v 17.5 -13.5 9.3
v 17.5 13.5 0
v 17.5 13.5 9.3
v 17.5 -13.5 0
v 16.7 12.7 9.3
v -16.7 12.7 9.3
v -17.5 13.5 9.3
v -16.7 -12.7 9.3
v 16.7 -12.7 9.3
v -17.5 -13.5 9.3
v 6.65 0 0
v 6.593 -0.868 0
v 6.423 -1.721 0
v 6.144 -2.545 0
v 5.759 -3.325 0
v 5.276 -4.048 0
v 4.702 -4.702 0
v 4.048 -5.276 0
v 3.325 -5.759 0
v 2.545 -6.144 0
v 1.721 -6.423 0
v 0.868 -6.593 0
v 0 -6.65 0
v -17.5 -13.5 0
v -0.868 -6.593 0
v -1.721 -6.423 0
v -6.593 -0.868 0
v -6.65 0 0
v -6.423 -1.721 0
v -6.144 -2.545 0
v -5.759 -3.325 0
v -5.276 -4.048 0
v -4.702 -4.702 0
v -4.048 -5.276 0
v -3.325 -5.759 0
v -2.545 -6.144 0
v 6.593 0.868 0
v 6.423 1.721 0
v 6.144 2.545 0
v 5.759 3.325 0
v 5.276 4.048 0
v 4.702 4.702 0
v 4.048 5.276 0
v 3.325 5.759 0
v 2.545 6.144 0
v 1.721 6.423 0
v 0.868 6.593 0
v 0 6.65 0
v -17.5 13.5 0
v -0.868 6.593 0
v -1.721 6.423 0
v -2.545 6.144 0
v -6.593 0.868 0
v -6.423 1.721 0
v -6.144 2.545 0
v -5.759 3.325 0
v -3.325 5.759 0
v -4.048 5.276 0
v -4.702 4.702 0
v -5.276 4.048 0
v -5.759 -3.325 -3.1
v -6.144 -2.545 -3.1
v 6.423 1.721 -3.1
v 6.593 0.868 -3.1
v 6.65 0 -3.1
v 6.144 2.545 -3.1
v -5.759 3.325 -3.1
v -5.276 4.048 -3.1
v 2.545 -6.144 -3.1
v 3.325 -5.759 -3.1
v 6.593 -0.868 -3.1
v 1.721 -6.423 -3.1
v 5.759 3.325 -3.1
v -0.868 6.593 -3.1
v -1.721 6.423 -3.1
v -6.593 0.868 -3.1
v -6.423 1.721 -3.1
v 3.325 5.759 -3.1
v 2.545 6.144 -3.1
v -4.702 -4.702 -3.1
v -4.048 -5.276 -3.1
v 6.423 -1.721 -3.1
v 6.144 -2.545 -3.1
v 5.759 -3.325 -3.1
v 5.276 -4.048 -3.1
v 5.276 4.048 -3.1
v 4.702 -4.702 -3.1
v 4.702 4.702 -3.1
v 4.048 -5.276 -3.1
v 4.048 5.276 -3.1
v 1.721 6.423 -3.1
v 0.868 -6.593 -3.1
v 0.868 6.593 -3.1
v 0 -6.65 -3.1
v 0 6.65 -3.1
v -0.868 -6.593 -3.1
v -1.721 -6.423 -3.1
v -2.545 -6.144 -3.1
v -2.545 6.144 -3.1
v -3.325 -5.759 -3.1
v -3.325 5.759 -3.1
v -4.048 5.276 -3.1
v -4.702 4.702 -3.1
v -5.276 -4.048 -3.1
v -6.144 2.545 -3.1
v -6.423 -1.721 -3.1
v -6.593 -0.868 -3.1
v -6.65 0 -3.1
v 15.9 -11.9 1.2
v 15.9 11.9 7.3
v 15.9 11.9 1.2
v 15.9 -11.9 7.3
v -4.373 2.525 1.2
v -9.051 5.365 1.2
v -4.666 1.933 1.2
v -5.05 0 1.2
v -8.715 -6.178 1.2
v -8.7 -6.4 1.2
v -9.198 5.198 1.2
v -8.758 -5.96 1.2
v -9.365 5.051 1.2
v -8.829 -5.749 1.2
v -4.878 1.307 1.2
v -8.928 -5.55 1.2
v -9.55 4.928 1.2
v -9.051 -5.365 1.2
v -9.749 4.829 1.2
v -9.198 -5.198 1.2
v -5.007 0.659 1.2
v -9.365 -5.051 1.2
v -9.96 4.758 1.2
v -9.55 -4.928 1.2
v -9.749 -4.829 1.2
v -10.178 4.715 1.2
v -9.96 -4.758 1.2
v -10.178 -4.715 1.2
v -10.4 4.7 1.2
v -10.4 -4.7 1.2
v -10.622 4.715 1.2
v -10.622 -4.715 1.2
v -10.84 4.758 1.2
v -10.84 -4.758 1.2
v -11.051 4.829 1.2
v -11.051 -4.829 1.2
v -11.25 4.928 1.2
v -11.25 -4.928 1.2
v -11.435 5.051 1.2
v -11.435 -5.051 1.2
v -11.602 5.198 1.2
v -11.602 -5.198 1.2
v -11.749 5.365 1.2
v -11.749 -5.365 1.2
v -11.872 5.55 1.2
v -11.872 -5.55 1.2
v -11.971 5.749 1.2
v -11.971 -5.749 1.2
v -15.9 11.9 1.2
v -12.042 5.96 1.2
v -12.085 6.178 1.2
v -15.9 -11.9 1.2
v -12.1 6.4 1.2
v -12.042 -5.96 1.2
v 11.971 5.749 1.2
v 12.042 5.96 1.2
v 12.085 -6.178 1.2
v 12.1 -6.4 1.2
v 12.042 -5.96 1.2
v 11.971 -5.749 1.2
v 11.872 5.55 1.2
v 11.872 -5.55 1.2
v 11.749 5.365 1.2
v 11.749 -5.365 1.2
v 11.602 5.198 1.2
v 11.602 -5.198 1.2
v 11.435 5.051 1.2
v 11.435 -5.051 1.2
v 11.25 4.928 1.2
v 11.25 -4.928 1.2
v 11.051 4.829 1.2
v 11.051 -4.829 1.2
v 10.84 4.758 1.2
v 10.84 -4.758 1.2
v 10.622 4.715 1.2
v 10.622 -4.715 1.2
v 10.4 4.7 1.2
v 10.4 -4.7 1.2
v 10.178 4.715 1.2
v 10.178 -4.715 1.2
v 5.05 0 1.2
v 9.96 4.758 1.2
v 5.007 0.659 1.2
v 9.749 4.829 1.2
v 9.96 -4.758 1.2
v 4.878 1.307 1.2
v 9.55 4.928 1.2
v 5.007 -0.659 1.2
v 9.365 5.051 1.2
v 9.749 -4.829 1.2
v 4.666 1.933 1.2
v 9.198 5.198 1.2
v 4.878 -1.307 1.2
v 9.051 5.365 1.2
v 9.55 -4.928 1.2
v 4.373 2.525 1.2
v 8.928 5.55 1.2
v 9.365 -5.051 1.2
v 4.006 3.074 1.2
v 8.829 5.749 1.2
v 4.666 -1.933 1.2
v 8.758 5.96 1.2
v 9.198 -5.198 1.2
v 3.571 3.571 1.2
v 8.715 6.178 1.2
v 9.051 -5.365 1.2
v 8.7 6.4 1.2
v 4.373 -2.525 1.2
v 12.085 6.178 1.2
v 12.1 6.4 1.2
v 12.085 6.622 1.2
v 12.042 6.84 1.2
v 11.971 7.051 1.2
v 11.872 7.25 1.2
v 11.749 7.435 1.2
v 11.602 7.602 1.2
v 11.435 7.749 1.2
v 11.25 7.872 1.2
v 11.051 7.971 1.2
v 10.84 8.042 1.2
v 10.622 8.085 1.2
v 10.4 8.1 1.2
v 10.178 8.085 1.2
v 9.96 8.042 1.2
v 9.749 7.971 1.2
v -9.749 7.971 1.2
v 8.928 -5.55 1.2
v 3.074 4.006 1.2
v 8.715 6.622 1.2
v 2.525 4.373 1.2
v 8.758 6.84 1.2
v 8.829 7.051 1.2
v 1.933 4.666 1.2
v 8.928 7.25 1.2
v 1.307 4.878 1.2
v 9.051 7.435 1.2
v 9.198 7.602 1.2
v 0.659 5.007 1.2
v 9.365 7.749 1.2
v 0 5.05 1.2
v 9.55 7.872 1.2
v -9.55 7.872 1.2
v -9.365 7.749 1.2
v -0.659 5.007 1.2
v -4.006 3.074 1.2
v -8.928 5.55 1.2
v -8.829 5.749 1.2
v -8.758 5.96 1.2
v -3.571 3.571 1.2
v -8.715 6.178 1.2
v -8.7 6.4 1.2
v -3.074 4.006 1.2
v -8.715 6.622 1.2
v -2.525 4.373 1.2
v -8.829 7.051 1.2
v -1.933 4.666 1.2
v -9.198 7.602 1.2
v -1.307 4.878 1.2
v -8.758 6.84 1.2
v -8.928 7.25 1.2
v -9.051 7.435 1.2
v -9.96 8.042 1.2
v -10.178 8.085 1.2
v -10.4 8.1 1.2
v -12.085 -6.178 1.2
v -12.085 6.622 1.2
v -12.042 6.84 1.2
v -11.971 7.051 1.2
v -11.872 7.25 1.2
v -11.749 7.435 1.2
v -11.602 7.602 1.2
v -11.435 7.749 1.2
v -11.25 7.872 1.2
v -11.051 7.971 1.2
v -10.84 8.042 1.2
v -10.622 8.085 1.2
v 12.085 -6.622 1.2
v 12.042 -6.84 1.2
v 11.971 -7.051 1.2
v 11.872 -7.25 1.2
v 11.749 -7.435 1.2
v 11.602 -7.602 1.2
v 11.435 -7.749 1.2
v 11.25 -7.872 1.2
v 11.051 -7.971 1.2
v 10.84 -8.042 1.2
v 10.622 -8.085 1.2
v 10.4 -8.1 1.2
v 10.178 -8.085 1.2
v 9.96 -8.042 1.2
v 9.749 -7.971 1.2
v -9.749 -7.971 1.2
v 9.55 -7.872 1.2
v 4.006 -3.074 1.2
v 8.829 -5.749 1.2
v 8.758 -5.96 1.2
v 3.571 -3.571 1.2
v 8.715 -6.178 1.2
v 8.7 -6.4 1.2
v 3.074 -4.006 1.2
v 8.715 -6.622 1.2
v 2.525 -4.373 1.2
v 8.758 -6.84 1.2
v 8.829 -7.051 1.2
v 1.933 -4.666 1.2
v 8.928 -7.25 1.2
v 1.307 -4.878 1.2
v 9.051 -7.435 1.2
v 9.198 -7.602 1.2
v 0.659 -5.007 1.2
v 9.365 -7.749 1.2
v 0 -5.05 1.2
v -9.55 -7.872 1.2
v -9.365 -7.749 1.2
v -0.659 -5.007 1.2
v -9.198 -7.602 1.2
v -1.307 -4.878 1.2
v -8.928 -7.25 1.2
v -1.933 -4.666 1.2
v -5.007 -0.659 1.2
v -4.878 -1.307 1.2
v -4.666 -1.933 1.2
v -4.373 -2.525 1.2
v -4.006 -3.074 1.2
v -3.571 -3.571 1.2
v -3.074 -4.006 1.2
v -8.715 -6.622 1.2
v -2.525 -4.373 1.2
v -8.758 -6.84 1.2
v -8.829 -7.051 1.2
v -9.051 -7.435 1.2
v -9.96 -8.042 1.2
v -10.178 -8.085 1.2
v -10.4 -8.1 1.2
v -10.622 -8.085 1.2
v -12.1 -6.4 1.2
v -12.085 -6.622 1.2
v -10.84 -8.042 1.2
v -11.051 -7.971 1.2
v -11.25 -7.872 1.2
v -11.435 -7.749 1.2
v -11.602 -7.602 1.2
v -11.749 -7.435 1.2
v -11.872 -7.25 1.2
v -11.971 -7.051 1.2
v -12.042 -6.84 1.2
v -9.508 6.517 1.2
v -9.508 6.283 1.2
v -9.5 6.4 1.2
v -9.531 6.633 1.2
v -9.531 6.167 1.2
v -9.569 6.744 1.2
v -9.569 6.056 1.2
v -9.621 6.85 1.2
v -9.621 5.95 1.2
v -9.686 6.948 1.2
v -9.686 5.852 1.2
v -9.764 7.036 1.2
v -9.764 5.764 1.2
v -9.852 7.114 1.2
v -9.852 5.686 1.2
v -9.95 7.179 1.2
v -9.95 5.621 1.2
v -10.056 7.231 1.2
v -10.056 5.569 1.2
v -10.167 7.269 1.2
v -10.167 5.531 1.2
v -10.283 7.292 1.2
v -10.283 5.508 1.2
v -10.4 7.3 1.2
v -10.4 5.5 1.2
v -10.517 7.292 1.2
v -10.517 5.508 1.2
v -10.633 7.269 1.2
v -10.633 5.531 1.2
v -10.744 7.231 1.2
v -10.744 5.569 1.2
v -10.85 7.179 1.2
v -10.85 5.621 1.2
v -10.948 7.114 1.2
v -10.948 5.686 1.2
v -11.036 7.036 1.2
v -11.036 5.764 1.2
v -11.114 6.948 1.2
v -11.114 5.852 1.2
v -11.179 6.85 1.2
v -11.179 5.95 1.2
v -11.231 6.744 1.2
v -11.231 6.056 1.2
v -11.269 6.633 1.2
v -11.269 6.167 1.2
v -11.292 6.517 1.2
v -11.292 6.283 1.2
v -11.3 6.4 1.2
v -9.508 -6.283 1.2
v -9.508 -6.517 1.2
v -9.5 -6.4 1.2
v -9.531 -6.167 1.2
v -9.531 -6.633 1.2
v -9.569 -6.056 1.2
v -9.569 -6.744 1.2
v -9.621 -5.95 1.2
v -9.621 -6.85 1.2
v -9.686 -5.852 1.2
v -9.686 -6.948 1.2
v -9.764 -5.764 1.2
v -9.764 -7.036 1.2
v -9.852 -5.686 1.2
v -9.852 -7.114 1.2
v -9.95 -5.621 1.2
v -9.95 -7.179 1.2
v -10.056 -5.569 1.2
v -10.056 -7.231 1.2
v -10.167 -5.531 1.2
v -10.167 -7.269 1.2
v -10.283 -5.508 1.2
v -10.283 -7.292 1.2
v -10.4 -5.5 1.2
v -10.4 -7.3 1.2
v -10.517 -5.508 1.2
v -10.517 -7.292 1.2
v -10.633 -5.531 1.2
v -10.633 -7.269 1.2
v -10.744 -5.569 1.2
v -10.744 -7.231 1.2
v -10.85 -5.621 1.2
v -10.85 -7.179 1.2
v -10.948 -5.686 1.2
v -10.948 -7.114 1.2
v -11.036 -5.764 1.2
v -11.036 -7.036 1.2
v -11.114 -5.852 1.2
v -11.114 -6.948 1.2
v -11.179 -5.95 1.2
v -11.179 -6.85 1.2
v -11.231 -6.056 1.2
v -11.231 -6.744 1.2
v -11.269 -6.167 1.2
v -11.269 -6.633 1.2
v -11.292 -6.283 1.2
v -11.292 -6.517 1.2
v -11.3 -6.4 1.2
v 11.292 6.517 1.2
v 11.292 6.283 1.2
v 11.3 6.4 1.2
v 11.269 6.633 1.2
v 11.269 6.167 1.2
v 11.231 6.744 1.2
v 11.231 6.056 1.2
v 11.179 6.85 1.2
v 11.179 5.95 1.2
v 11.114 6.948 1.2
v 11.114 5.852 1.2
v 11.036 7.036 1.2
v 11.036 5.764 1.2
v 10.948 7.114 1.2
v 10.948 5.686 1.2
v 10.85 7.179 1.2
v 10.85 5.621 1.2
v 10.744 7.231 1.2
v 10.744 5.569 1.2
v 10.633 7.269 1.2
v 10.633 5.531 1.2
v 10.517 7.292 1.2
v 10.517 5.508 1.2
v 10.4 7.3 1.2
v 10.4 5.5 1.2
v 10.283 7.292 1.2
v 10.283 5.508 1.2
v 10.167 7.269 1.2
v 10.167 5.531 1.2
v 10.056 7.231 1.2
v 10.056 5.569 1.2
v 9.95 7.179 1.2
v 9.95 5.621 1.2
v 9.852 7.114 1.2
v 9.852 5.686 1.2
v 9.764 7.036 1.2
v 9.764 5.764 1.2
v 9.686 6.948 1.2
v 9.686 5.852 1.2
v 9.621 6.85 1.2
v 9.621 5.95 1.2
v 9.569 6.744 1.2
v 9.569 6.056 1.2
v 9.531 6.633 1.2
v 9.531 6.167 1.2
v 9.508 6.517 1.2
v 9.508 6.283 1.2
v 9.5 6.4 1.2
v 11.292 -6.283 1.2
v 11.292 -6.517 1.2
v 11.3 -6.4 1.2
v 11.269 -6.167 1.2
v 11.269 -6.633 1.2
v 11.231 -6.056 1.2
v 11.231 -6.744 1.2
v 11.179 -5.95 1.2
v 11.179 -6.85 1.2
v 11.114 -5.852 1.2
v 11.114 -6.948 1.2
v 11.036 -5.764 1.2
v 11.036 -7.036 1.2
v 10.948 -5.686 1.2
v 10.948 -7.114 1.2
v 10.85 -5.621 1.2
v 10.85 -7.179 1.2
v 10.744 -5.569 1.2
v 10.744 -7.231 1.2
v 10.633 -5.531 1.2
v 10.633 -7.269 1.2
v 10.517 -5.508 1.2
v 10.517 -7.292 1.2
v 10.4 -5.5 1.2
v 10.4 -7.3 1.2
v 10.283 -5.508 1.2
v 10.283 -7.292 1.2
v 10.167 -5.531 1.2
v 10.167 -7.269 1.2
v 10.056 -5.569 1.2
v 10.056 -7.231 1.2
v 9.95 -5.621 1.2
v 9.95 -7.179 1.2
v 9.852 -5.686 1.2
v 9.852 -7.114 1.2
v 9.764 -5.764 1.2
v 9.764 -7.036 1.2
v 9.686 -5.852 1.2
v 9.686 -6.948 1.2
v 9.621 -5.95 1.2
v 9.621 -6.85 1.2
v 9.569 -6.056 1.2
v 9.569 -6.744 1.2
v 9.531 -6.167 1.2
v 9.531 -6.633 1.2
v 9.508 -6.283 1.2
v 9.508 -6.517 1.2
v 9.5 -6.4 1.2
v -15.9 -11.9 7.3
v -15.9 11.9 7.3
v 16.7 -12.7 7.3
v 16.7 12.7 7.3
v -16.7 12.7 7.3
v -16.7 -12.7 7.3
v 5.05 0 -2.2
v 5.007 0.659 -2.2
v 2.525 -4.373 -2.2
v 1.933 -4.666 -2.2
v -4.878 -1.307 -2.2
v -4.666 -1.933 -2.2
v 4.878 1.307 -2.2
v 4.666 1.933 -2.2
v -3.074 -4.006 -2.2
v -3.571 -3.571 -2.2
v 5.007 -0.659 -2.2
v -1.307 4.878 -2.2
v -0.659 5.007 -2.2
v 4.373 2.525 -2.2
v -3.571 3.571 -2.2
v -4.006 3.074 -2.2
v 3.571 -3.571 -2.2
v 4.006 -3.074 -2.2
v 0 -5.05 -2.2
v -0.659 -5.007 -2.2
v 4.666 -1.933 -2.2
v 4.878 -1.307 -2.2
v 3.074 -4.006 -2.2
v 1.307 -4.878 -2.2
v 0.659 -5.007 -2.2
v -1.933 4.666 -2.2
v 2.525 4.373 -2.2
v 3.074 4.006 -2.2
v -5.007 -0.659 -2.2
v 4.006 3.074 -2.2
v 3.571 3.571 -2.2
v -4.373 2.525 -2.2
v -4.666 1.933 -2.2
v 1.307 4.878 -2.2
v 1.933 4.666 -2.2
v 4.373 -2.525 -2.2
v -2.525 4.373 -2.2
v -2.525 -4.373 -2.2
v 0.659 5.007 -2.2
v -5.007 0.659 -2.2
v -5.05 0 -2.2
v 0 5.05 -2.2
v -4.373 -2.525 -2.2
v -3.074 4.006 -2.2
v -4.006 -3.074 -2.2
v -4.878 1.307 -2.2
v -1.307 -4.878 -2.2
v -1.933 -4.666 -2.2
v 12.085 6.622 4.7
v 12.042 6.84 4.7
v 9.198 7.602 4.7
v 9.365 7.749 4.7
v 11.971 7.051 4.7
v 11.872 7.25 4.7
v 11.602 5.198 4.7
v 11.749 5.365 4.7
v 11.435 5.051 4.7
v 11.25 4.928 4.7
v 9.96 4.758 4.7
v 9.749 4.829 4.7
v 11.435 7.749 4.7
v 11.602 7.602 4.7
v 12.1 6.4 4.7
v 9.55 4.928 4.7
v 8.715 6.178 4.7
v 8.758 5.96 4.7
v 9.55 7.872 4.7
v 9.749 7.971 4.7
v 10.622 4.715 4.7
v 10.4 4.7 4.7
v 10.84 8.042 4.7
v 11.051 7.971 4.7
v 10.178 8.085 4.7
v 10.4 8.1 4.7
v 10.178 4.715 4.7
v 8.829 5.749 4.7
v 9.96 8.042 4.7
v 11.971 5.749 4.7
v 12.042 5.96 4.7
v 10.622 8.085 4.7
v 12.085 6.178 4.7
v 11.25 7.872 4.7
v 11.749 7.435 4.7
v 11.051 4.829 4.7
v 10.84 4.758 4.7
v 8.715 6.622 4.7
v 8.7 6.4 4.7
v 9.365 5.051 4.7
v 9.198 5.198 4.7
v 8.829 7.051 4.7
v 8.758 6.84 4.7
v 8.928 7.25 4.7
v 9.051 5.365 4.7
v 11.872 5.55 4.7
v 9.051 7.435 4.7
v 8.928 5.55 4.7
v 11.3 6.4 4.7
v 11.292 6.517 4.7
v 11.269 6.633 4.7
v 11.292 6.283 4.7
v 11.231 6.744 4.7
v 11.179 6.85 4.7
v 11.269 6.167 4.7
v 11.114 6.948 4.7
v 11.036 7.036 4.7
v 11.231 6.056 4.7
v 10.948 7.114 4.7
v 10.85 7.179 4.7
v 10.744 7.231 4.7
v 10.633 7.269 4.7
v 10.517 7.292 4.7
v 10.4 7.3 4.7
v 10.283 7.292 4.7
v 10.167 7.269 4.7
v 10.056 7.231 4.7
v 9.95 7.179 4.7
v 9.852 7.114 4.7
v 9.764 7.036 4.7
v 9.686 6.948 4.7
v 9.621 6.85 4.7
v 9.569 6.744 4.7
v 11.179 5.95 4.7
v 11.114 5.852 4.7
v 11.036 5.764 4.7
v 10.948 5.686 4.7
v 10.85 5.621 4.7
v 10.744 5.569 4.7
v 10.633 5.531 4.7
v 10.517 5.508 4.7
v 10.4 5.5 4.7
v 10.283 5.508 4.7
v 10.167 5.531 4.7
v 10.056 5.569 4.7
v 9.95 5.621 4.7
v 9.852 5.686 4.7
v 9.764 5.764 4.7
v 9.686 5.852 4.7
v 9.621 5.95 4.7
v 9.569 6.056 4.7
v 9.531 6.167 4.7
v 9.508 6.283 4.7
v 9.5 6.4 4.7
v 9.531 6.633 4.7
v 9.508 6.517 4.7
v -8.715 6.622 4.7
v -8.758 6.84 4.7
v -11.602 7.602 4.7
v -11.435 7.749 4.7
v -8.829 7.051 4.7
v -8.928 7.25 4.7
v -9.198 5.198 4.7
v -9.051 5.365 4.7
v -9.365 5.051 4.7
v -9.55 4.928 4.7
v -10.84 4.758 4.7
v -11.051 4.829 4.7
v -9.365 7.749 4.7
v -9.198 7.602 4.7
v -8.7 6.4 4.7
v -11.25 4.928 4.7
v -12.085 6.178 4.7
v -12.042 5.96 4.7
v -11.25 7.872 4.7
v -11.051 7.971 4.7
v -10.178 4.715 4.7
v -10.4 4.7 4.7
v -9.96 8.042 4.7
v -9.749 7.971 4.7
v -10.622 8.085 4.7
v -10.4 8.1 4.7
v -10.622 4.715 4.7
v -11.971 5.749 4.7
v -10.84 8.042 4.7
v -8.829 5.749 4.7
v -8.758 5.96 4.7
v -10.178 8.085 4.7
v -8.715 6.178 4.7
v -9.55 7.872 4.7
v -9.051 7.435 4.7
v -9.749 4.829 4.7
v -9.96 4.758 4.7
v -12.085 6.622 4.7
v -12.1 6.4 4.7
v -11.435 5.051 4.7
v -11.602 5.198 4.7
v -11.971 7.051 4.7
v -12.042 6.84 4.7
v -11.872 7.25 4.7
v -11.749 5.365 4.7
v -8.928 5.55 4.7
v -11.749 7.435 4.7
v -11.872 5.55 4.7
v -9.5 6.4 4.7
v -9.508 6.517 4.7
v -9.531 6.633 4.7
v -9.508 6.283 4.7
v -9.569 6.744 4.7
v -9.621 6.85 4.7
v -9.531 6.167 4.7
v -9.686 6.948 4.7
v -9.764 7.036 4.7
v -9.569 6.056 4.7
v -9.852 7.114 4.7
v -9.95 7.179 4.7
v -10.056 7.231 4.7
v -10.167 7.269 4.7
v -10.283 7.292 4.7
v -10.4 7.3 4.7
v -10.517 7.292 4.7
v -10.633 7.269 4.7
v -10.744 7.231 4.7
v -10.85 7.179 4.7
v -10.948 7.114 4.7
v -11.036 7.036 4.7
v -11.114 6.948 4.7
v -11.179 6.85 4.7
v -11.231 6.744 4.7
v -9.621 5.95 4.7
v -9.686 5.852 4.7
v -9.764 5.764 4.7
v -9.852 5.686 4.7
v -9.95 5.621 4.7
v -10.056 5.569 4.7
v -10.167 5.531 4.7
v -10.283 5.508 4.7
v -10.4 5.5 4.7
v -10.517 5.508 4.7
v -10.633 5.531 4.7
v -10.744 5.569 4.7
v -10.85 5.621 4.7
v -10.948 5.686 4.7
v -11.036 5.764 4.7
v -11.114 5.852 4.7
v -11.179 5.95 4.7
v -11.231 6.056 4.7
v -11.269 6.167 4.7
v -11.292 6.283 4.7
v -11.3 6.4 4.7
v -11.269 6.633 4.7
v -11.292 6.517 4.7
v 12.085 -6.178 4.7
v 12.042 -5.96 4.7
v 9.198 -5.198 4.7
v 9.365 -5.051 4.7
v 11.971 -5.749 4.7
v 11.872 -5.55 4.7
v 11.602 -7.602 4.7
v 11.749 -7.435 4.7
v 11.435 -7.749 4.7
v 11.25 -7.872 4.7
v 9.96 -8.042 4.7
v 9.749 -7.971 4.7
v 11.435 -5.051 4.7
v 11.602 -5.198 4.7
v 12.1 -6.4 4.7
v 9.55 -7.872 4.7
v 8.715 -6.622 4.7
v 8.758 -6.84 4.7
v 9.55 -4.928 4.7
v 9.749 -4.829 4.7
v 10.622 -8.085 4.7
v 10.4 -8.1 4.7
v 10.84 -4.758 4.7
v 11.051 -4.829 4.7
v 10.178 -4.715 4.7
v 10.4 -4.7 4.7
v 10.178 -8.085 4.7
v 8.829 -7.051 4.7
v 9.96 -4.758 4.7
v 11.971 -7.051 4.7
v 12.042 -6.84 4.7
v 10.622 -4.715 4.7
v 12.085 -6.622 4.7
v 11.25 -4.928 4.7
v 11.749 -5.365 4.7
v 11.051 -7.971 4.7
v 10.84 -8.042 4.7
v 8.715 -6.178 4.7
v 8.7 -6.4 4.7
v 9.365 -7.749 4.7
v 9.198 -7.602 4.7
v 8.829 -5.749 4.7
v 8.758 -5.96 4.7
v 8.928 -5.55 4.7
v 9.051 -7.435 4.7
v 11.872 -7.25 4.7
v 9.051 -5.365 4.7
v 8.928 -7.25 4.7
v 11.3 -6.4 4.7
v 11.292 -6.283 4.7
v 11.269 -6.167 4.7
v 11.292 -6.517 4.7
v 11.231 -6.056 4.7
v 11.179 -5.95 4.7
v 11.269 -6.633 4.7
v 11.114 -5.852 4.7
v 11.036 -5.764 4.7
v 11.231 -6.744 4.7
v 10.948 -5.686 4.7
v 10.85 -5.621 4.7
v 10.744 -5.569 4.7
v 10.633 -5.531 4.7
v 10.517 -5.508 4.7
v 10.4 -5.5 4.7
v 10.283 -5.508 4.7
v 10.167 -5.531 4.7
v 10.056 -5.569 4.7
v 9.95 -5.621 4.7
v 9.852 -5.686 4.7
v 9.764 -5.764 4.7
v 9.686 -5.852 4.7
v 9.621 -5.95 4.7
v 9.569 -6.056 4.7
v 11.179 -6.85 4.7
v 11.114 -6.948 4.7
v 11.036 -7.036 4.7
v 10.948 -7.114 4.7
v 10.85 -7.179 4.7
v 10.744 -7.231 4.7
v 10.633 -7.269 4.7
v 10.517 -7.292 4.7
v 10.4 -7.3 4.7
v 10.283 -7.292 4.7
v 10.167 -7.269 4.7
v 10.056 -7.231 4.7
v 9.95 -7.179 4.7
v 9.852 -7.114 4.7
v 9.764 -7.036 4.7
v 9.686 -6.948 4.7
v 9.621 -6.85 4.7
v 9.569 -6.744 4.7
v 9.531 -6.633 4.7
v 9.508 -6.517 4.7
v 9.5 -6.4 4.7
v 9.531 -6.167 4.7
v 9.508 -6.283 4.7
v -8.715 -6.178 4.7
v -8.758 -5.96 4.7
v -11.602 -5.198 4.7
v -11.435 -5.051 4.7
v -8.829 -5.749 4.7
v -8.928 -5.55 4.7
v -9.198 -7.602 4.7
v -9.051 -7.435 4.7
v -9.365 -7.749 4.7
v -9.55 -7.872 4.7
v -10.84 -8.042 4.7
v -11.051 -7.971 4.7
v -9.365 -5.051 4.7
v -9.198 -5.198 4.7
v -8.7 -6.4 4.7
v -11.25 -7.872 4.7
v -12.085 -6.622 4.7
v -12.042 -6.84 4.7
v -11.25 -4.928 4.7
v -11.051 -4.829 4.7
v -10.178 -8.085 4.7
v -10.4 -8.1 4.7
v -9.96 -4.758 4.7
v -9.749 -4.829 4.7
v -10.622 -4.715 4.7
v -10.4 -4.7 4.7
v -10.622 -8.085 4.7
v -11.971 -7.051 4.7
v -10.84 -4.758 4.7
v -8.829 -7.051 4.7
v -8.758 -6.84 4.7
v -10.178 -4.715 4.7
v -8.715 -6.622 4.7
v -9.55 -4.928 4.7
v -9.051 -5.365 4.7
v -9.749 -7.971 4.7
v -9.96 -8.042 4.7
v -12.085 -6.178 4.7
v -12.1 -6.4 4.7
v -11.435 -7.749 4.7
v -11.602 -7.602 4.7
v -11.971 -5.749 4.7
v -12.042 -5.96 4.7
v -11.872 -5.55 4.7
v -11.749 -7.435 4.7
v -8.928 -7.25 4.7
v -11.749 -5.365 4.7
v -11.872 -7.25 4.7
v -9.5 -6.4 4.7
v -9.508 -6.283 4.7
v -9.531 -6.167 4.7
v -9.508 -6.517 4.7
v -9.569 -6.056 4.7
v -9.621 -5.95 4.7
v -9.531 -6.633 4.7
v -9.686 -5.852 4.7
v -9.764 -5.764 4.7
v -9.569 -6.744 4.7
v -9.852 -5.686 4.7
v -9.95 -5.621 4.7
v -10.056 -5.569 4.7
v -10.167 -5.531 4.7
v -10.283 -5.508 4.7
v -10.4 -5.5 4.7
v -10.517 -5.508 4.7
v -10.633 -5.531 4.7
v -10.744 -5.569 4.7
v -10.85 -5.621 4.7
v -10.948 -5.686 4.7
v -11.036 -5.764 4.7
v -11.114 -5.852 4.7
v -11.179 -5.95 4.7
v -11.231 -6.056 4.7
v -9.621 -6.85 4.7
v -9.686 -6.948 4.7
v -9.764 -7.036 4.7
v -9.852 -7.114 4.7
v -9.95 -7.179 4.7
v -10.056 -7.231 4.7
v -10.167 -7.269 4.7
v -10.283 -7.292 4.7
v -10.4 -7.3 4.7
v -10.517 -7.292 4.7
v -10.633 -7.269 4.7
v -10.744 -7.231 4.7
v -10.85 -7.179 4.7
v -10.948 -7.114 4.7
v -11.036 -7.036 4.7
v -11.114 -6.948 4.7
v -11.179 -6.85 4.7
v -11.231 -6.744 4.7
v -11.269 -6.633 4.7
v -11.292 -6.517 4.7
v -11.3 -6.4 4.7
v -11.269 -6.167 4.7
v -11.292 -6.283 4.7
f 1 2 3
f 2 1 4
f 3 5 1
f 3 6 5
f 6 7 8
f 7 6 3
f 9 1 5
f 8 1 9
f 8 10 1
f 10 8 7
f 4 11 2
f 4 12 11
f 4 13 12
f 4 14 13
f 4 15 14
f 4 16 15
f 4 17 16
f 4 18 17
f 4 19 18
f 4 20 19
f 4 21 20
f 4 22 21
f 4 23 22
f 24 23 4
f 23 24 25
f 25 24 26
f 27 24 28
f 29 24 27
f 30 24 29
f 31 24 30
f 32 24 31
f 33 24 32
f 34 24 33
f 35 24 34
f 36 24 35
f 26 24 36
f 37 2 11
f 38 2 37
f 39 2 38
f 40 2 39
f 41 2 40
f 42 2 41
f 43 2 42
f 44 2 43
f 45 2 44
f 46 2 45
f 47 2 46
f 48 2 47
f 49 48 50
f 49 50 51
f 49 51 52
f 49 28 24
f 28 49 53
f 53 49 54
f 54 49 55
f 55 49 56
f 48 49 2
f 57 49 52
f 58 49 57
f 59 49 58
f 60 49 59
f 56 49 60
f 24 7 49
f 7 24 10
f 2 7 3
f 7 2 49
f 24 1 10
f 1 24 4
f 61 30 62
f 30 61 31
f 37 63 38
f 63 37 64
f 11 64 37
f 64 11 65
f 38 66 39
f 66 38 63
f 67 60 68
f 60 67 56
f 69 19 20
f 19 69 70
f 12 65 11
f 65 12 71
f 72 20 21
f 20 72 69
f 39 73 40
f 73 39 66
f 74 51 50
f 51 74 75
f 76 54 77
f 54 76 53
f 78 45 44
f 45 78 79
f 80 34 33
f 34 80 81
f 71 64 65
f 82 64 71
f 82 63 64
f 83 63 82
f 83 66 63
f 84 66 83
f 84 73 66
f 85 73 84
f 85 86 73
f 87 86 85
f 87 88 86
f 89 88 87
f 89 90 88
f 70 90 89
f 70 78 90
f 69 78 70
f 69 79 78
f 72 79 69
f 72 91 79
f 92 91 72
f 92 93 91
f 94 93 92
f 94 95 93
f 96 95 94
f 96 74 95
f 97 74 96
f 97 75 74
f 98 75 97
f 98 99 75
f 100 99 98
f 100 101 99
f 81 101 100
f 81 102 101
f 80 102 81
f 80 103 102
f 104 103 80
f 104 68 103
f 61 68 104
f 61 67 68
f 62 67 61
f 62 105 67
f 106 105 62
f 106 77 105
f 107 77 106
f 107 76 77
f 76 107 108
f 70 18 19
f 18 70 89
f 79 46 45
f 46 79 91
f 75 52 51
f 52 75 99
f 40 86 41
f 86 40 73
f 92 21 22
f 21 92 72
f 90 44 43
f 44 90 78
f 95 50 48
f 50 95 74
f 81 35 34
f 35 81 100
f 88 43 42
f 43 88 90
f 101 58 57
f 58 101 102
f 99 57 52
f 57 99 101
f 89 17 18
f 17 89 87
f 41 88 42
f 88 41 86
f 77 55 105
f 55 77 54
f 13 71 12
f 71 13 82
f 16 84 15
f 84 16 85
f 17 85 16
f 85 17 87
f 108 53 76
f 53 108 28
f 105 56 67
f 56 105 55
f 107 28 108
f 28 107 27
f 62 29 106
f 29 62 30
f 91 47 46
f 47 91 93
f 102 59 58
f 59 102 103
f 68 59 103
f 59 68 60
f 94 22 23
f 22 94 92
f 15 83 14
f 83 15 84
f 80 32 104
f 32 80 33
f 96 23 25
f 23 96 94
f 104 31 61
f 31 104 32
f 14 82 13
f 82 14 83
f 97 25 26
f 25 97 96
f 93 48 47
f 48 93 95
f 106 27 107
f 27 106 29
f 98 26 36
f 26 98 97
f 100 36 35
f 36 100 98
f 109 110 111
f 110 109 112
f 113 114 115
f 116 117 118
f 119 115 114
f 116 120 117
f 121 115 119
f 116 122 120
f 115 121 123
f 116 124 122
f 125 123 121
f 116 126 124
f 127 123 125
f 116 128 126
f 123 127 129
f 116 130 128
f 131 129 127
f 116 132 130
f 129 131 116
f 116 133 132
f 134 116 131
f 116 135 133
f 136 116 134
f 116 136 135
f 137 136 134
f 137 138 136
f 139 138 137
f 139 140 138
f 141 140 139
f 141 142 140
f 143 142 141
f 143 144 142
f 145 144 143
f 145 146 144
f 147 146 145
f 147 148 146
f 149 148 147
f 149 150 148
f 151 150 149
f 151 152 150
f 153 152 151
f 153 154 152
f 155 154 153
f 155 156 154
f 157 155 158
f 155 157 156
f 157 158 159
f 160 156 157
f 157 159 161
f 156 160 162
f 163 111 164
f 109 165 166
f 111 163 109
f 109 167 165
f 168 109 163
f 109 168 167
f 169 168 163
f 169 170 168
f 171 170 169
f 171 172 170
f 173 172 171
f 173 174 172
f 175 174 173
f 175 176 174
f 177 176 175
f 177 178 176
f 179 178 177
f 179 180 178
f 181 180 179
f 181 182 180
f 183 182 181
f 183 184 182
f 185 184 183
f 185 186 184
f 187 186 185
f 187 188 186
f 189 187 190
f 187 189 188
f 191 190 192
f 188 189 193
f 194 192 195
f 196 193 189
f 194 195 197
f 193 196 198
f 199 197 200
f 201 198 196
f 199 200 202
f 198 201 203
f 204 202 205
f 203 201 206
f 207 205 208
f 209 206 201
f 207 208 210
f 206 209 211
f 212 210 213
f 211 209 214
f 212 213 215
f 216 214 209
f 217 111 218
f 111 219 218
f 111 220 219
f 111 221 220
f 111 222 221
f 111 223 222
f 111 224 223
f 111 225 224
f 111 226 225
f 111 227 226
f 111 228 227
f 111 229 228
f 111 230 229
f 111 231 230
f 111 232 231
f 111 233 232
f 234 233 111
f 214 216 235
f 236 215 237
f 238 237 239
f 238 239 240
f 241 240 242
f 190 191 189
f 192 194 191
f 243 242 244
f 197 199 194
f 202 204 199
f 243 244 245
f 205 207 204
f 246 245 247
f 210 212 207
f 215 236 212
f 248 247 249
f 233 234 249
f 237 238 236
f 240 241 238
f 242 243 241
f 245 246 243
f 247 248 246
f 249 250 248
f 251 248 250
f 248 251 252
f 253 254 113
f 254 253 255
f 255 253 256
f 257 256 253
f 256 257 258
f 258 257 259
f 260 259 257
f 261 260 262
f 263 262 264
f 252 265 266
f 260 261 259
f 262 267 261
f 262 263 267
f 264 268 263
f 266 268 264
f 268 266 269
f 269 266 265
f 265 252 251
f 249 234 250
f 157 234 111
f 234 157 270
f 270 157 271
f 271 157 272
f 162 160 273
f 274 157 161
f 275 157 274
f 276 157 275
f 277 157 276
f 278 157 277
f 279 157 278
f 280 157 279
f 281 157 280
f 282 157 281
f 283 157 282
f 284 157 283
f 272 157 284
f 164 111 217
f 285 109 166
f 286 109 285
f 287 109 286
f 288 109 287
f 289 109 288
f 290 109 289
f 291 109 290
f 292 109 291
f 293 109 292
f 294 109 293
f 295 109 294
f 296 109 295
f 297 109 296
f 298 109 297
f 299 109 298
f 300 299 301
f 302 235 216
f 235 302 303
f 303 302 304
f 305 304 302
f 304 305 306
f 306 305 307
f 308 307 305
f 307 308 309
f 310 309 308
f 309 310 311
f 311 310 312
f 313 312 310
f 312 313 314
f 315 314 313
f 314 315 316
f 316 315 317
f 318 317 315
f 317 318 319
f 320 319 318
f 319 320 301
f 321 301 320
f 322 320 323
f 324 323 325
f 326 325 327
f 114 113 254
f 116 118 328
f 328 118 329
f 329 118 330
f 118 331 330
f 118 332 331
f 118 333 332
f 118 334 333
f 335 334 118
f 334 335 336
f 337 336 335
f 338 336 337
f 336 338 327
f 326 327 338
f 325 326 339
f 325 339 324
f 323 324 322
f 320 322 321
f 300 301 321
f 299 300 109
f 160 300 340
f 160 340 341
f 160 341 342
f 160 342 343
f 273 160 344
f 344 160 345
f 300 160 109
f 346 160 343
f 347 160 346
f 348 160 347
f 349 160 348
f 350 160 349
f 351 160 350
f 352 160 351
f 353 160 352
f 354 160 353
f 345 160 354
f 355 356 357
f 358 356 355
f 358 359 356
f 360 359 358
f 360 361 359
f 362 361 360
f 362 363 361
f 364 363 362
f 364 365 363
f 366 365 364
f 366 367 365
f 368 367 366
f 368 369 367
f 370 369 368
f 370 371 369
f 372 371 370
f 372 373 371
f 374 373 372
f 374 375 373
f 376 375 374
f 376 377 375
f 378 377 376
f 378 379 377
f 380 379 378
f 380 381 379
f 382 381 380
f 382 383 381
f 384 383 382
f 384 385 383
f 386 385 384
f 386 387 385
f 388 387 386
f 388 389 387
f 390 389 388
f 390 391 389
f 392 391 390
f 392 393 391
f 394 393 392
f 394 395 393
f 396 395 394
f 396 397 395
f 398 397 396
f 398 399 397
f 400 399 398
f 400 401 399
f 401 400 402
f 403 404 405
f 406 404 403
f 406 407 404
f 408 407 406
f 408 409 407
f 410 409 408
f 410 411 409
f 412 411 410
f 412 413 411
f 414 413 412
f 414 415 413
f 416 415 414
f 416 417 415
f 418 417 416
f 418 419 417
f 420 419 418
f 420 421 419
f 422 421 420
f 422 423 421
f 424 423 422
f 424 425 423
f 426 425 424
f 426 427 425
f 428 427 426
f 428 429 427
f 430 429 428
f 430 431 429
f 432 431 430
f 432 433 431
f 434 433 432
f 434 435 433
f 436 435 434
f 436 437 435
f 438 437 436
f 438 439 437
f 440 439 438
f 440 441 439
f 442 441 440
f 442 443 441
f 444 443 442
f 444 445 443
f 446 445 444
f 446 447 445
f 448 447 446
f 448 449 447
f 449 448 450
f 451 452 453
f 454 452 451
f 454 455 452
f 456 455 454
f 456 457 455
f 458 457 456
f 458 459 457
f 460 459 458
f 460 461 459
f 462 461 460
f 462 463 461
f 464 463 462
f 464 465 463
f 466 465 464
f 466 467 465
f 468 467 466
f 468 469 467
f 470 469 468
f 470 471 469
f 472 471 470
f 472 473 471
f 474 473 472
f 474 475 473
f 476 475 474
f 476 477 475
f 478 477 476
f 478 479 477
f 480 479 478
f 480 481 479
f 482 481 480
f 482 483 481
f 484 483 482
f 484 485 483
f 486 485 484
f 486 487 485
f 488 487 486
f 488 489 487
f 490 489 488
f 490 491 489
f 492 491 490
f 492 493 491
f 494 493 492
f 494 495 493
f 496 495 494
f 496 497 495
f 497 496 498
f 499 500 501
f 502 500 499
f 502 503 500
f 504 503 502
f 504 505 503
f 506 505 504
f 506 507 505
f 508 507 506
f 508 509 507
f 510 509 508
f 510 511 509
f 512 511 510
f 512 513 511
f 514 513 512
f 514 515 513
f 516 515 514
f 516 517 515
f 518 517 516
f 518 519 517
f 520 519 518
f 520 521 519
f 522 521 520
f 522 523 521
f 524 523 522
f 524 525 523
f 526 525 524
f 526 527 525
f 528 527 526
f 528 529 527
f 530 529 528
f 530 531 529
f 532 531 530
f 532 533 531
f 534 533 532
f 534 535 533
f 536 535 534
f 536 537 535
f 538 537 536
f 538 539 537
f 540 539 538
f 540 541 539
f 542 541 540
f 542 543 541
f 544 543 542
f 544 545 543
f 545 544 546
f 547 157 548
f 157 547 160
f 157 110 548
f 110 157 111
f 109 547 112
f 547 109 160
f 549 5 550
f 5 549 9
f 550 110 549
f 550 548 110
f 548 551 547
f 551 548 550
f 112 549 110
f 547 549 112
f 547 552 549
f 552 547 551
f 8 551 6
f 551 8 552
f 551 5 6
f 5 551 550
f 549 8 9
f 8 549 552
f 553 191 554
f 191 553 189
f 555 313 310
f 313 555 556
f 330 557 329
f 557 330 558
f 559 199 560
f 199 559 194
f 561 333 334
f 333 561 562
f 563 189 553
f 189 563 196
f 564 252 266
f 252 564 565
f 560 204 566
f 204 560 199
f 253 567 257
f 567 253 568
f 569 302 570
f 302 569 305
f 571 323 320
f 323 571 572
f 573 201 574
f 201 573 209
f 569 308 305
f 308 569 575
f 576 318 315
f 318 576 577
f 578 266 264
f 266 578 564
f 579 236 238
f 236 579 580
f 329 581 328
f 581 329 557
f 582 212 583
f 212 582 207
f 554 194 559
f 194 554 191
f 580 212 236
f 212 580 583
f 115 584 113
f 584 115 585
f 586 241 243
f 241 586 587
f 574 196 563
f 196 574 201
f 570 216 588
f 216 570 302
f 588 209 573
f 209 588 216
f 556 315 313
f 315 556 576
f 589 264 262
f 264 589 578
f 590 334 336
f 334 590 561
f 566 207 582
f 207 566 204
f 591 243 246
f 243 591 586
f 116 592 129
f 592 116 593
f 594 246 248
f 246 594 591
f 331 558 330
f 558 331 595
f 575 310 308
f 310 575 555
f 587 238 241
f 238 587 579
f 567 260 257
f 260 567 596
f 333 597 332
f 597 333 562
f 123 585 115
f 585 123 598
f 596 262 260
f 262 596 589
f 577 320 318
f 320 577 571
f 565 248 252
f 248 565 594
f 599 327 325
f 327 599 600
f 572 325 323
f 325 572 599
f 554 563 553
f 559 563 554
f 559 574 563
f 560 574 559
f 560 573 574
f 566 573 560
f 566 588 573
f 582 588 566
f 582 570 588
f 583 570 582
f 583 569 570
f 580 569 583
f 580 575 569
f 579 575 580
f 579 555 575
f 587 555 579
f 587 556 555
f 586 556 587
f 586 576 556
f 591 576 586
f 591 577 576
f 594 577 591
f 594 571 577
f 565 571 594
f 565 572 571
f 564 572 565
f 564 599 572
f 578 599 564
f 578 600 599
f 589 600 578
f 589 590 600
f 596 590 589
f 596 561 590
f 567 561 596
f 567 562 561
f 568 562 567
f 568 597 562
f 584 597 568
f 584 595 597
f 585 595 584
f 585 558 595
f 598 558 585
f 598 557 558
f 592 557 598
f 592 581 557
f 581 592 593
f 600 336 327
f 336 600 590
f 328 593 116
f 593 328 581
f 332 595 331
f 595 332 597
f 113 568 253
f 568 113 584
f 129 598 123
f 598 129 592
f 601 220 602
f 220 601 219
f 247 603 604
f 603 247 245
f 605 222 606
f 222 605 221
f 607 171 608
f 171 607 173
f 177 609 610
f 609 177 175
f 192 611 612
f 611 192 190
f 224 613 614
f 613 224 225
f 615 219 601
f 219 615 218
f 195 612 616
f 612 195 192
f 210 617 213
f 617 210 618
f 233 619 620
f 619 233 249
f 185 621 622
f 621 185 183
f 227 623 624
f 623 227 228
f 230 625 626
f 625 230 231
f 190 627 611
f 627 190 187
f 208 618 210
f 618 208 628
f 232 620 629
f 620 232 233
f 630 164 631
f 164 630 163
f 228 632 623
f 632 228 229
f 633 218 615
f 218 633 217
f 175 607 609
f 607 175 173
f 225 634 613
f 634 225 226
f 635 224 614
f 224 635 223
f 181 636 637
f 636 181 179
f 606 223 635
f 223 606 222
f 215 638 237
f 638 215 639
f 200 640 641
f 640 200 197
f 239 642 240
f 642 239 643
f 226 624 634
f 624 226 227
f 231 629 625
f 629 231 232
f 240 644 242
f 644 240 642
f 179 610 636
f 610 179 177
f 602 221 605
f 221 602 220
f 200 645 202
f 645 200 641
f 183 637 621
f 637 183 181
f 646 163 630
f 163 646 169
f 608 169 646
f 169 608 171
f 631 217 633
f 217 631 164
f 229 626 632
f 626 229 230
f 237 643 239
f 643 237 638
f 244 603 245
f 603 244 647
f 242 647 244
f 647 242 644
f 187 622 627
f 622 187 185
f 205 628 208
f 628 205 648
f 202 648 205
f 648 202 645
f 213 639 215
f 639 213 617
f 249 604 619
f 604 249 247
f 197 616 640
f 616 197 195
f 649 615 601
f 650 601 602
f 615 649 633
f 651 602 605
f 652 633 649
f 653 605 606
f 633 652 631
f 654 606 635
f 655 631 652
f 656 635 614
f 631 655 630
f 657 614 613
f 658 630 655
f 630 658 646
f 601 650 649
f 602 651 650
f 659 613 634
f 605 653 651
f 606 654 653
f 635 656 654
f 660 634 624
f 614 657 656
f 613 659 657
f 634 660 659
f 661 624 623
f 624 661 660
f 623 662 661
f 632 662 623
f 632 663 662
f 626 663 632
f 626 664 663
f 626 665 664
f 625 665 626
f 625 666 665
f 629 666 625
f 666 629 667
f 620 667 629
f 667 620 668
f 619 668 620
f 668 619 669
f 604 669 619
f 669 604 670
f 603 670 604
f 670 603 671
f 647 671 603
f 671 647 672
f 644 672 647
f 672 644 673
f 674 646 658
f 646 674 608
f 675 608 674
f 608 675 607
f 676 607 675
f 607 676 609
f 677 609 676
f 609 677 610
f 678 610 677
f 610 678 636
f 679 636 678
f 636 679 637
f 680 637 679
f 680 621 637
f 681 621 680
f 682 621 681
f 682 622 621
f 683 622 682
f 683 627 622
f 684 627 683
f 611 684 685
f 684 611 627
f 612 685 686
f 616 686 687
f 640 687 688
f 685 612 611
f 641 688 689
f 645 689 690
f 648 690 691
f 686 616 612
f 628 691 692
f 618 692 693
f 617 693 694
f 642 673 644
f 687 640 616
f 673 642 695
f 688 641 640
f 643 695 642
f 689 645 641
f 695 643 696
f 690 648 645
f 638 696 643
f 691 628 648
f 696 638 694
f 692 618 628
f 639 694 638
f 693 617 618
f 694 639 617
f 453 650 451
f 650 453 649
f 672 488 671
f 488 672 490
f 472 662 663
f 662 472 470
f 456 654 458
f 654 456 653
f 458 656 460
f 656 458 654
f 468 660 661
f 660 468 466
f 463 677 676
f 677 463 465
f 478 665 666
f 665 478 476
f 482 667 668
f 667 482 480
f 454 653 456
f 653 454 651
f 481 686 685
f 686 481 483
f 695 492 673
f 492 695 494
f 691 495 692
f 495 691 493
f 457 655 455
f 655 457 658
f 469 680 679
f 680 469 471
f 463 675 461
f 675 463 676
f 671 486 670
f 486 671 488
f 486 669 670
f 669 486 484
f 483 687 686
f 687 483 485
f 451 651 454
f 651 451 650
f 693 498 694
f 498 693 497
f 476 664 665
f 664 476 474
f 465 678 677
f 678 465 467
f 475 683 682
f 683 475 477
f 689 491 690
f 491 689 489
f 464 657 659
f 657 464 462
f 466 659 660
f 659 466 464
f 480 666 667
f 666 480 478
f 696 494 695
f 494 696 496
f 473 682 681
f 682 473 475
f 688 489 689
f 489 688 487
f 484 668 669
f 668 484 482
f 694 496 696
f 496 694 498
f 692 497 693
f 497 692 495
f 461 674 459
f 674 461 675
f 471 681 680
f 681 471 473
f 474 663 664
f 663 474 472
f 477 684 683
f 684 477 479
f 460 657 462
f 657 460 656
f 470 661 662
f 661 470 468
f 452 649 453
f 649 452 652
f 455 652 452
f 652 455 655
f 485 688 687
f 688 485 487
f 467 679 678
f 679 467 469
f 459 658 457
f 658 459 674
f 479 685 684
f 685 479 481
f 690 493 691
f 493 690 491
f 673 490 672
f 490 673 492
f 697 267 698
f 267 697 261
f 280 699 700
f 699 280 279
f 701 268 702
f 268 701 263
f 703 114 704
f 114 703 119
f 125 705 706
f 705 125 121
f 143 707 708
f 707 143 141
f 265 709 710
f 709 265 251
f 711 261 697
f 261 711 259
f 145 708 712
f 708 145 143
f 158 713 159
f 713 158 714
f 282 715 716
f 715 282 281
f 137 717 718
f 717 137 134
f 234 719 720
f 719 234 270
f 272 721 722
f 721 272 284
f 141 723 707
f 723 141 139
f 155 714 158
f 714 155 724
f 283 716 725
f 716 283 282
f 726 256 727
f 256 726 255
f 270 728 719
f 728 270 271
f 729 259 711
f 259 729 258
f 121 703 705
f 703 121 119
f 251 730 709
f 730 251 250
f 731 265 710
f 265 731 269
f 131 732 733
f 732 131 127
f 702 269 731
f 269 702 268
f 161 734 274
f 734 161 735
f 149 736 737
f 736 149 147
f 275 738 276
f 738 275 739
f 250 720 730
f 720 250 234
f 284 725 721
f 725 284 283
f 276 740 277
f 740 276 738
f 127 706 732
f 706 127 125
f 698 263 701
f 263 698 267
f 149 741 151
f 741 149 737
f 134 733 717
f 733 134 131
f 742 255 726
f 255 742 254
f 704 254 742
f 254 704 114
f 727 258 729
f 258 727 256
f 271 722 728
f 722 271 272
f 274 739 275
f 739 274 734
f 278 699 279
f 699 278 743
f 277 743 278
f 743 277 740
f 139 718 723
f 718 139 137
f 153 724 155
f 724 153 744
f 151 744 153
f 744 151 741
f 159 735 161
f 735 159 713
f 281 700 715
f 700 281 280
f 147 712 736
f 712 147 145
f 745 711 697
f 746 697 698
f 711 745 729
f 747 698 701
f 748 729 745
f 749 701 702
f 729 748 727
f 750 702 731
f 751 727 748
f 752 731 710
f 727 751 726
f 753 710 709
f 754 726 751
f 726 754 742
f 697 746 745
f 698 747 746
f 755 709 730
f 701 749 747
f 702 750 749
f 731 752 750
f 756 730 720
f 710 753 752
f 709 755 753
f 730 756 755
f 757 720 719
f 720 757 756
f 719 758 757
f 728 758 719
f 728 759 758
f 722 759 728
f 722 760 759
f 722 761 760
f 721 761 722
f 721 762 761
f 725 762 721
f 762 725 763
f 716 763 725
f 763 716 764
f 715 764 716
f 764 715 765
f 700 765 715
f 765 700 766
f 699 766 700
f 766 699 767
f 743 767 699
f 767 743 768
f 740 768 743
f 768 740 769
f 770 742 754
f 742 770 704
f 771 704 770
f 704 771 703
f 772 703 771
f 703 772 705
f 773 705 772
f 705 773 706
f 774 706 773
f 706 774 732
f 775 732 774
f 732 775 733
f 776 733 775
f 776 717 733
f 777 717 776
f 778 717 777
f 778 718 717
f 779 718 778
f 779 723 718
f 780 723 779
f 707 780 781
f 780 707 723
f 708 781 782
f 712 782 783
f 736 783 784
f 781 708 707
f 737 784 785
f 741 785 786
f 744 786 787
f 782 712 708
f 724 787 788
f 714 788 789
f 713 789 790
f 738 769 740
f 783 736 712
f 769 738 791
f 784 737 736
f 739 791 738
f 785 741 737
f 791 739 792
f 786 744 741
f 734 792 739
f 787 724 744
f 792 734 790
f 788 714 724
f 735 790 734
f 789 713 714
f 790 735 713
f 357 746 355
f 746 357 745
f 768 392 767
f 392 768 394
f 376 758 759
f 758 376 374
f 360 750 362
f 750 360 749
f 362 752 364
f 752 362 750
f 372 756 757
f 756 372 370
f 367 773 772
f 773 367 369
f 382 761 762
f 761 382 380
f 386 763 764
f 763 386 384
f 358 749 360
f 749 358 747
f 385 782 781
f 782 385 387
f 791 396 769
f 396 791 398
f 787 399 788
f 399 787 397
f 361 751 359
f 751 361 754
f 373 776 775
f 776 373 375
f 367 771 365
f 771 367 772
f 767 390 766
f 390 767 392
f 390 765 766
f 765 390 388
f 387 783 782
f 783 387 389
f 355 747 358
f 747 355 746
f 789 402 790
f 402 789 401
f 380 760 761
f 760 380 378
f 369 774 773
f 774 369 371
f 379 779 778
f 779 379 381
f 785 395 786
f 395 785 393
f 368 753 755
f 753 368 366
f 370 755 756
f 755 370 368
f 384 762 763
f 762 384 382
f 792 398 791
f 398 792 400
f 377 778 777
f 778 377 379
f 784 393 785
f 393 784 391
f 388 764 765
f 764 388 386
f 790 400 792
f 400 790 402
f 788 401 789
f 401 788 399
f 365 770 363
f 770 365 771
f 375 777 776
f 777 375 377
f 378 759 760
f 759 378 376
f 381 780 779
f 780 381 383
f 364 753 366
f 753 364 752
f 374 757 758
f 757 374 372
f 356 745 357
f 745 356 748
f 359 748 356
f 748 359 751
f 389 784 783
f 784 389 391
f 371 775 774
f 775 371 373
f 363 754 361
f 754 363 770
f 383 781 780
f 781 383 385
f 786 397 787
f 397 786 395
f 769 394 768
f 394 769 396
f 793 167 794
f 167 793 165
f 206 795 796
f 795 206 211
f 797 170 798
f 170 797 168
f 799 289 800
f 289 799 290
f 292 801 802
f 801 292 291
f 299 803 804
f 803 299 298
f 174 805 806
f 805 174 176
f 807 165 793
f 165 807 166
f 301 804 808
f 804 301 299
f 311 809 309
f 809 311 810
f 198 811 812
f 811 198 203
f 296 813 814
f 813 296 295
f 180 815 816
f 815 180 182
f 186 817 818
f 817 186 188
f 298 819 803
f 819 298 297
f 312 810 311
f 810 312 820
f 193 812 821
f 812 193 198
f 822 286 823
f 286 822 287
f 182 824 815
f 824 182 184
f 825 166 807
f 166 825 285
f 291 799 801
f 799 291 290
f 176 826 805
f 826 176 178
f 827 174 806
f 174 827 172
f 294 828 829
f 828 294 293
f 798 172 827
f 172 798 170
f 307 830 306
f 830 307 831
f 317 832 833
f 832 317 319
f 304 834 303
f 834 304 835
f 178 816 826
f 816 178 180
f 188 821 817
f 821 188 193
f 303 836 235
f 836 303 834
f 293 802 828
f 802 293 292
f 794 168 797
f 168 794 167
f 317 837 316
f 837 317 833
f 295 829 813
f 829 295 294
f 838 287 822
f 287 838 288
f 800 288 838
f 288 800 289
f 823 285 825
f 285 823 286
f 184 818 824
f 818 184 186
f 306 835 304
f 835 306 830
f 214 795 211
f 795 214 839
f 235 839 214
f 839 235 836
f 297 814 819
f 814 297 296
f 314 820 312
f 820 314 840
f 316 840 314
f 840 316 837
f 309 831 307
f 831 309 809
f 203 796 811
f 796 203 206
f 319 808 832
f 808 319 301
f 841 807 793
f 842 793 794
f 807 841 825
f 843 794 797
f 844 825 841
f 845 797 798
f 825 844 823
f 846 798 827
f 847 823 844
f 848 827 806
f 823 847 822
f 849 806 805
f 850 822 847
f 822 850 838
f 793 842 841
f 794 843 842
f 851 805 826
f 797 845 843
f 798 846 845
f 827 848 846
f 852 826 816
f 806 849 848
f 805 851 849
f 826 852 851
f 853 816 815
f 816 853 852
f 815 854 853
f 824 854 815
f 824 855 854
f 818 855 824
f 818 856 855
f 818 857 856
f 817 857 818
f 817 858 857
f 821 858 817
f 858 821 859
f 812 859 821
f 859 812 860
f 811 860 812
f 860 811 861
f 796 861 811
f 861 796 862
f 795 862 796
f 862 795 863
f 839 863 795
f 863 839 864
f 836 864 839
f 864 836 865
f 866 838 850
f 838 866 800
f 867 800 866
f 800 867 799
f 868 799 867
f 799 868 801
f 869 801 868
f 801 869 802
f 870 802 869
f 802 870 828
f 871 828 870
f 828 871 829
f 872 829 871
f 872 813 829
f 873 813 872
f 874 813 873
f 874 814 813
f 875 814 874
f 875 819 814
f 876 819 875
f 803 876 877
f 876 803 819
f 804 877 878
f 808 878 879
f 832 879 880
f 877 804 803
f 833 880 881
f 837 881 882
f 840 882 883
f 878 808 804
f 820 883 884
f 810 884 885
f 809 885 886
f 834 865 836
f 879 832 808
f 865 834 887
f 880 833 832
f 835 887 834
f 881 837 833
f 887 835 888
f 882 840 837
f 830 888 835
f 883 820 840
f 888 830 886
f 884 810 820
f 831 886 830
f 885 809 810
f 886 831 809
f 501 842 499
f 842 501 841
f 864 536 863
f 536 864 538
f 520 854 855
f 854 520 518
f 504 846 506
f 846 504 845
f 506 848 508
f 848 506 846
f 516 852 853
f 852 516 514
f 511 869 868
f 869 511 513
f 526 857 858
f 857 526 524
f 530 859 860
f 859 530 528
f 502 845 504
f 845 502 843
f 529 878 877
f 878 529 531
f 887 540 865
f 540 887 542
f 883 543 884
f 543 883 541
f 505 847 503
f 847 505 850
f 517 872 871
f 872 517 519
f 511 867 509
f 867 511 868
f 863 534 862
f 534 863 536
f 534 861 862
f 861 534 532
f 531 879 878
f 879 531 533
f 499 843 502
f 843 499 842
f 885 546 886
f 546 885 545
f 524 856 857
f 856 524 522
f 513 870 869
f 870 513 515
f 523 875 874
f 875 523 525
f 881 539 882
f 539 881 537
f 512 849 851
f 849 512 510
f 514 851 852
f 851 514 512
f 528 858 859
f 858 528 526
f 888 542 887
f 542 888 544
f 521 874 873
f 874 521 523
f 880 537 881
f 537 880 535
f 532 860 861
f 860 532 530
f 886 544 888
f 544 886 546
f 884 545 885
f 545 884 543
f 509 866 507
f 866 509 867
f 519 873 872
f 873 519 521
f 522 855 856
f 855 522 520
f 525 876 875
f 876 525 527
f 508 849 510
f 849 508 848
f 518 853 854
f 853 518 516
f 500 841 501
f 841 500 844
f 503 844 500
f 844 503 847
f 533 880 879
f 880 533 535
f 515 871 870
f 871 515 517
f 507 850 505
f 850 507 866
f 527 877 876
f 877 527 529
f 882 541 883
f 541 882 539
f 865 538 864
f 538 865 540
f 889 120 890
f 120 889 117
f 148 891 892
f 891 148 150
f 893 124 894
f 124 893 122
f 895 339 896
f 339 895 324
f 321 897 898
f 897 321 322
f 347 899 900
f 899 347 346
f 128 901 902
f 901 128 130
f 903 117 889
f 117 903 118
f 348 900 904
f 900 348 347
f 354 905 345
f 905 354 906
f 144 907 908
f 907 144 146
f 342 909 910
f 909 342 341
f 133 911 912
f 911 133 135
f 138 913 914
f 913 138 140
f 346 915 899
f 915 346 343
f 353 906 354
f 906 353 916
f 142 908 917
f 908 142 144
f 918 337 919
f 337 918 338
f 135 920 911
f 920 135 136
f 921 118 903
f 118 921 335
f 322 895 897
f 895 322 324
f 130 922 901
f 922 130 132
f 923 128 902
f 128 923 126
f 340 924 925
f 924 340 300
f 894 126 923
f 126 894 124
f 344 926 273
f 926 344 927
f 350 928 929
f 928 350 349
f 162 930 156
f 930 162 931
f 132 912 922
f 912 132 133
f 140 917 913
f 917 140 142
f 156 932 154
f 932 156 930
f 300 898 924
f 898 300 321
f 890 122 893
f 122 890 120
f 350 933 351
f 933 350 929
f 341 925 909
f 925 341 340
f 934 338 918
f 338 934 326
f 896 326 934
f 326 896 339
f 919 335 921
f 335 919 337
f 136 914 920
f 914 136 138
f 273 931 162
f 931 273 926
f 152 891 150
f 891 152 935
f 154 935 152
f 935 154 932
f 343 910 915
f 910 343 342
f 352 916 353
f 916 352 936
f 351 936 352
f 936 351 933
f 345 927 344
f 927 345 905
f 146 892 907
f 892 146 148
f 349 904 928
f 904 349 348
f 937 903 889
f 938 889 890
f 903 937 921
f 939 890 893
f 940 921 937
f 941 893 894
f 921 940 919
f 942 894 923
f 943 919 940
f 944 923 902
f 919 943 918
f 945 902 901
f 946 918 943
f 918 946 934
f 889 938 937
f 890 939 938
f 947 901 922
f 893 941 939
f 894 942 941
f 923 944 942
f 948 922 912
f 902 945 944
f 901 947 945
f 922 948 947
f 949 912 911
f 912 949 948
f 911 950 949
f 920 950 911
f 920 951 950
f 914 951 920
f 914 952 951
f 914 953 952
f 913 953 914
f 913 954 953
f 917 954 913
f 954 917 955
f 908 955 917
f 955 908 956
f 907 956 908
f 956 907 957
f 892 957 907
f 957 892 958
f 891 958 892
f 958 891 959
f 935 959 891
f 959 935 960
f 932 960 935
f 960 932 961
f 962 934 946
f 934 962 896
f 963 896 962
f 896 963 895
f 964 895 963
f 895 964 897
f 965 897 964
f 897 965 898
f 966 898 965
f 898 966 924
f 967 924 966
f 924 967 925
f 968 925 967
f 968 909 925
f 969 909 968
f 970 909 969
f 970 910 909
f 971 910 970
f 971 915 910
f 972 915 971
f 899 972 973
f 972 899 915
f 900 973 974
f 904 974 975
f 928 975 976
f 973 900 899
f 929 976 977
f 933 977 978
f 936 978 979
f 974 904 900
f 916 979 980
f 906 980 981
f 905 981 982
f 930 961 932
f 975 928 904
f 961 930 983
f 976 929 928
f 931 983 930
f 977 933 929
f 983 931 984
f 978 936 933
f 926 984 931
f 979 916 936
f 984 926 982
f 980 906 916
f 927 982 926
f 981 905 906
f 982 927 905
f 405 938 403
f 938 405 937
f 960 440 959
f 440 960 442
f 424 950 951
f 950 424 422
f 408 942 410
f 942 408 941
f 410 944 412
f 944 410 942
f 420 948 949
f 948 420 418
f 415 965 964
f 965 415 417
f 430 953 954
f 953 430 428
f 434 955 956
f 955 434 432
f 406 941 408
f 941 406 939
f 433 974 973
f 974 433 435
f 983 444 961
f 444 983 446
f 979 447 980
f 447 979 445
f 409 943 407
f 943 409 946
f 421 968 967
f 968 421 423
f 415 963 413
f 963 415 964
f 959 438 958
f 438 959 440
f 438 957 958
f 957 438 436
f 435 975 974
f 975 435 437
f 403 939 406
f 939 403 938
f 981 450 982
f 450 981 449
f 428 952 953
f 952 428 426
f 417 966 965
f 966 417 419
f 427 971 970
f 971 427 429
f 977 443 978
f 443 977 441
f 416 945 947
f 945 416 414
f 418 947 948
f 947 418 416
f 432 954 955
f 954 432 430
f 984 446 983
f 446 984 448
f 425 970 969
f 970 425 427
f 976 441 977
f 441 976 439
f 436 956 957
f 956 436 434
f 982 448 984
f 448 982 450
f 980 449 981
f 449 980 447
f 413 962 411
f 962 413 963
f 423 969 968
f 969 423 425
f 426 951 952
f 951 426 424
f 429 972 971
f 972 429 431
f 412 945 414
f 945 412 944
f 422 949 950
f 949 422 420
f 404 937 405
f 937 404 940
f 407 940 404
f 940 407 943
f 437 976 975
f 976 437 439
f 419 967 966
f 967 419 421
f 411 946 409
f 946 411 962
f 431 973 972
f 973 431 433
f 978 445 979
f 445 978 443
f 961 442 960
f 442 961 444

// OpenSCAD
// ===================================================================
// Meridian wrist array — satellite pod, single-chamber redesign
// Board: Adafruit DRV2605L (STEMMA QT breakout), ~25.8 x 17.8mm
// Motor: Vybronics VG1030001XH, measured 9.93mm dia x 3.30mm (bare can)
// ===================================================================
// Change a number in this block rather than editing geometry below.
// Anything marked CONFIRM is a placeholder against your real board;
// the rest come from your caliper measurements / earlier decisions.

// --- Board ---
board_l        = 25.8;   // long axis (STEMMA connector direction)
board_w        = 17.8;
board_t        = 1.6;    // typical PCB thickness — CONFIRM
hole_inset     = 2.5;    // mounting hole center, inset from each board edge — CONFIRM
standoff_h     = 3.5;    // clearance under board for solder joints + STEMMA connector
standoff_od    = 3.4;    // standoff post diameter
screw_pilot_d  = 1.8;    // pilot hole, self-tapping M2

// --- Case shell ---
wall_t         = 1.6;
floor_t        = 1.2;    // general chamber floor, under the board area
margin         = 3.0;    // board edge to inner wall
lid_lip_h      = 2.0;    // step the lid seats into

// --- Motor pocket (from your measurements) ---
motor_d_meas   = 9.93;
motor_t_meas   = 3.30;
bore_clear     = 0.17;   // diametral clearance — tune from your test coupon
bore_d         = motor_d_meas + bore_clear;
pocket_depth   = motor_t_meas + 0.10;    // slight axial clearance
skin_floor_t   = 0.90;   // thin floor left under the motor: the skin coupling layer
boss_d         = bore_d + 2*wall_t;      // material ring around the bore
boss_h         = pocket_depth + skin_floor_t;
boss_drop      = boss_h - floor_t;       // how far the boss hangs below the general floor

// Pocket position, relative to chamber center — nudge to sit under
// wherever your OUT+/OUT- pads land. Keep it clear of both the standoffs
// AND the outer wall: distance from (motor_x,motor_y) to any standoff
// center must exceed standoff_od/2 + boss_d/2, and |motor_x|+boss_d/2 /
// |motor_y|+boss_d/2 must stay inside outer_l/2 / outer_w/2 minus wall_t.
// Centered clears both by a comfortable margin — move it once you know
// your board's actual pad layout.
motor_x        = 0;
motor_y        = 0;

// --- Derived chamber ---
chamber_l = board_l + 2*margin;
chamber_w = board_w + 2*margin;
chamber_h = standoff_h + board_t + 3;   // headroom above board for wire dressing

outer_l = chamber_l + 2*wall_t;
outer_w = chamber_w + 2*wall_t;

$fn = 48;

module standoff(x, y) {
    // small -0.2 overlap into the floor below so this fuses into one solid
    // instead of just touching it (touching-but-not-overlapping geometry
    // slices fine most of the time, but it's a common source of hairline
    // non-manifold errors — cheap to avoid)
    translate([x, y, -0.2])
        difference() {
            cylinder(d=standoff_od, h=standoff_h + 0.2);
            translate([0, 0, 0.1])
                cylinder(d=screw_pilot_d, h=standoff_h + 0.2);
        }
}

module standoffs() {
    translate([0, 0, floor_t]) {
        standoff( board_l/2 - hole_inset,   board_w/2 - hole_inset);
        standoff(-(board_l/2 - hole_inset),  board_w/2 - hole_inset);
        standoff( board_l/2 - hole_inset,  -(board_w/2 - hole_inset));
        standoff(-(board_l/2 - hole_inset), -(board_w/2 - hole_inset));
    }
}

module pod_bottom() {
    difference() {
        union() {
            // outer shell: floor + walls
            translate([-outer_l/2, -outer_w/2, 0])
                cube([outer_l, outer_w, floor_t + chamber_h]);

            // motor boss: extra material dropped below the general floor,
            // only under the motor footprint — gives room for the pocket
            // without thickening the whole case, and doubles as the raised
            // skin-contact point right where the actuator is
            translate([motor_x, motor_y, -boss_drop])
                cylinder(d=boss_d, h=boss_drop);
        }

        // hollow the chamber interior, leaving walls + floor
        translate([-chamber_l/2, -chamber_w/2, floor_t])
            cube([chamber_l, chamber_w, chamber_h + 1]);

        // lid seating lip
        translate([-chamber_l/2 - wall_t/2, -chamber_w/2 - wall_t/2, floor_t + chamber_h - lid_lip_h])
            cube([chamber_l + wall_t, chamber_w + wall_t, lid_lip_h + 1]);

        // motor pocket: blind hole cut down from the chamber floor's top
        // face, stopping short of the outer skin-facing surface. It opens
        // straight into the same chamber the board sits in, so the leads
        // just run free from the pocket to the board — no separate wire
        // channel needed now that there's only one chamber.
        translate([motor_x, motor_y, floor_t - pocket_depth])
            cylinder(d=bore_d, h=pocket_depth + 0.01);
    }

    standoffs();
}

pod_bottom();
